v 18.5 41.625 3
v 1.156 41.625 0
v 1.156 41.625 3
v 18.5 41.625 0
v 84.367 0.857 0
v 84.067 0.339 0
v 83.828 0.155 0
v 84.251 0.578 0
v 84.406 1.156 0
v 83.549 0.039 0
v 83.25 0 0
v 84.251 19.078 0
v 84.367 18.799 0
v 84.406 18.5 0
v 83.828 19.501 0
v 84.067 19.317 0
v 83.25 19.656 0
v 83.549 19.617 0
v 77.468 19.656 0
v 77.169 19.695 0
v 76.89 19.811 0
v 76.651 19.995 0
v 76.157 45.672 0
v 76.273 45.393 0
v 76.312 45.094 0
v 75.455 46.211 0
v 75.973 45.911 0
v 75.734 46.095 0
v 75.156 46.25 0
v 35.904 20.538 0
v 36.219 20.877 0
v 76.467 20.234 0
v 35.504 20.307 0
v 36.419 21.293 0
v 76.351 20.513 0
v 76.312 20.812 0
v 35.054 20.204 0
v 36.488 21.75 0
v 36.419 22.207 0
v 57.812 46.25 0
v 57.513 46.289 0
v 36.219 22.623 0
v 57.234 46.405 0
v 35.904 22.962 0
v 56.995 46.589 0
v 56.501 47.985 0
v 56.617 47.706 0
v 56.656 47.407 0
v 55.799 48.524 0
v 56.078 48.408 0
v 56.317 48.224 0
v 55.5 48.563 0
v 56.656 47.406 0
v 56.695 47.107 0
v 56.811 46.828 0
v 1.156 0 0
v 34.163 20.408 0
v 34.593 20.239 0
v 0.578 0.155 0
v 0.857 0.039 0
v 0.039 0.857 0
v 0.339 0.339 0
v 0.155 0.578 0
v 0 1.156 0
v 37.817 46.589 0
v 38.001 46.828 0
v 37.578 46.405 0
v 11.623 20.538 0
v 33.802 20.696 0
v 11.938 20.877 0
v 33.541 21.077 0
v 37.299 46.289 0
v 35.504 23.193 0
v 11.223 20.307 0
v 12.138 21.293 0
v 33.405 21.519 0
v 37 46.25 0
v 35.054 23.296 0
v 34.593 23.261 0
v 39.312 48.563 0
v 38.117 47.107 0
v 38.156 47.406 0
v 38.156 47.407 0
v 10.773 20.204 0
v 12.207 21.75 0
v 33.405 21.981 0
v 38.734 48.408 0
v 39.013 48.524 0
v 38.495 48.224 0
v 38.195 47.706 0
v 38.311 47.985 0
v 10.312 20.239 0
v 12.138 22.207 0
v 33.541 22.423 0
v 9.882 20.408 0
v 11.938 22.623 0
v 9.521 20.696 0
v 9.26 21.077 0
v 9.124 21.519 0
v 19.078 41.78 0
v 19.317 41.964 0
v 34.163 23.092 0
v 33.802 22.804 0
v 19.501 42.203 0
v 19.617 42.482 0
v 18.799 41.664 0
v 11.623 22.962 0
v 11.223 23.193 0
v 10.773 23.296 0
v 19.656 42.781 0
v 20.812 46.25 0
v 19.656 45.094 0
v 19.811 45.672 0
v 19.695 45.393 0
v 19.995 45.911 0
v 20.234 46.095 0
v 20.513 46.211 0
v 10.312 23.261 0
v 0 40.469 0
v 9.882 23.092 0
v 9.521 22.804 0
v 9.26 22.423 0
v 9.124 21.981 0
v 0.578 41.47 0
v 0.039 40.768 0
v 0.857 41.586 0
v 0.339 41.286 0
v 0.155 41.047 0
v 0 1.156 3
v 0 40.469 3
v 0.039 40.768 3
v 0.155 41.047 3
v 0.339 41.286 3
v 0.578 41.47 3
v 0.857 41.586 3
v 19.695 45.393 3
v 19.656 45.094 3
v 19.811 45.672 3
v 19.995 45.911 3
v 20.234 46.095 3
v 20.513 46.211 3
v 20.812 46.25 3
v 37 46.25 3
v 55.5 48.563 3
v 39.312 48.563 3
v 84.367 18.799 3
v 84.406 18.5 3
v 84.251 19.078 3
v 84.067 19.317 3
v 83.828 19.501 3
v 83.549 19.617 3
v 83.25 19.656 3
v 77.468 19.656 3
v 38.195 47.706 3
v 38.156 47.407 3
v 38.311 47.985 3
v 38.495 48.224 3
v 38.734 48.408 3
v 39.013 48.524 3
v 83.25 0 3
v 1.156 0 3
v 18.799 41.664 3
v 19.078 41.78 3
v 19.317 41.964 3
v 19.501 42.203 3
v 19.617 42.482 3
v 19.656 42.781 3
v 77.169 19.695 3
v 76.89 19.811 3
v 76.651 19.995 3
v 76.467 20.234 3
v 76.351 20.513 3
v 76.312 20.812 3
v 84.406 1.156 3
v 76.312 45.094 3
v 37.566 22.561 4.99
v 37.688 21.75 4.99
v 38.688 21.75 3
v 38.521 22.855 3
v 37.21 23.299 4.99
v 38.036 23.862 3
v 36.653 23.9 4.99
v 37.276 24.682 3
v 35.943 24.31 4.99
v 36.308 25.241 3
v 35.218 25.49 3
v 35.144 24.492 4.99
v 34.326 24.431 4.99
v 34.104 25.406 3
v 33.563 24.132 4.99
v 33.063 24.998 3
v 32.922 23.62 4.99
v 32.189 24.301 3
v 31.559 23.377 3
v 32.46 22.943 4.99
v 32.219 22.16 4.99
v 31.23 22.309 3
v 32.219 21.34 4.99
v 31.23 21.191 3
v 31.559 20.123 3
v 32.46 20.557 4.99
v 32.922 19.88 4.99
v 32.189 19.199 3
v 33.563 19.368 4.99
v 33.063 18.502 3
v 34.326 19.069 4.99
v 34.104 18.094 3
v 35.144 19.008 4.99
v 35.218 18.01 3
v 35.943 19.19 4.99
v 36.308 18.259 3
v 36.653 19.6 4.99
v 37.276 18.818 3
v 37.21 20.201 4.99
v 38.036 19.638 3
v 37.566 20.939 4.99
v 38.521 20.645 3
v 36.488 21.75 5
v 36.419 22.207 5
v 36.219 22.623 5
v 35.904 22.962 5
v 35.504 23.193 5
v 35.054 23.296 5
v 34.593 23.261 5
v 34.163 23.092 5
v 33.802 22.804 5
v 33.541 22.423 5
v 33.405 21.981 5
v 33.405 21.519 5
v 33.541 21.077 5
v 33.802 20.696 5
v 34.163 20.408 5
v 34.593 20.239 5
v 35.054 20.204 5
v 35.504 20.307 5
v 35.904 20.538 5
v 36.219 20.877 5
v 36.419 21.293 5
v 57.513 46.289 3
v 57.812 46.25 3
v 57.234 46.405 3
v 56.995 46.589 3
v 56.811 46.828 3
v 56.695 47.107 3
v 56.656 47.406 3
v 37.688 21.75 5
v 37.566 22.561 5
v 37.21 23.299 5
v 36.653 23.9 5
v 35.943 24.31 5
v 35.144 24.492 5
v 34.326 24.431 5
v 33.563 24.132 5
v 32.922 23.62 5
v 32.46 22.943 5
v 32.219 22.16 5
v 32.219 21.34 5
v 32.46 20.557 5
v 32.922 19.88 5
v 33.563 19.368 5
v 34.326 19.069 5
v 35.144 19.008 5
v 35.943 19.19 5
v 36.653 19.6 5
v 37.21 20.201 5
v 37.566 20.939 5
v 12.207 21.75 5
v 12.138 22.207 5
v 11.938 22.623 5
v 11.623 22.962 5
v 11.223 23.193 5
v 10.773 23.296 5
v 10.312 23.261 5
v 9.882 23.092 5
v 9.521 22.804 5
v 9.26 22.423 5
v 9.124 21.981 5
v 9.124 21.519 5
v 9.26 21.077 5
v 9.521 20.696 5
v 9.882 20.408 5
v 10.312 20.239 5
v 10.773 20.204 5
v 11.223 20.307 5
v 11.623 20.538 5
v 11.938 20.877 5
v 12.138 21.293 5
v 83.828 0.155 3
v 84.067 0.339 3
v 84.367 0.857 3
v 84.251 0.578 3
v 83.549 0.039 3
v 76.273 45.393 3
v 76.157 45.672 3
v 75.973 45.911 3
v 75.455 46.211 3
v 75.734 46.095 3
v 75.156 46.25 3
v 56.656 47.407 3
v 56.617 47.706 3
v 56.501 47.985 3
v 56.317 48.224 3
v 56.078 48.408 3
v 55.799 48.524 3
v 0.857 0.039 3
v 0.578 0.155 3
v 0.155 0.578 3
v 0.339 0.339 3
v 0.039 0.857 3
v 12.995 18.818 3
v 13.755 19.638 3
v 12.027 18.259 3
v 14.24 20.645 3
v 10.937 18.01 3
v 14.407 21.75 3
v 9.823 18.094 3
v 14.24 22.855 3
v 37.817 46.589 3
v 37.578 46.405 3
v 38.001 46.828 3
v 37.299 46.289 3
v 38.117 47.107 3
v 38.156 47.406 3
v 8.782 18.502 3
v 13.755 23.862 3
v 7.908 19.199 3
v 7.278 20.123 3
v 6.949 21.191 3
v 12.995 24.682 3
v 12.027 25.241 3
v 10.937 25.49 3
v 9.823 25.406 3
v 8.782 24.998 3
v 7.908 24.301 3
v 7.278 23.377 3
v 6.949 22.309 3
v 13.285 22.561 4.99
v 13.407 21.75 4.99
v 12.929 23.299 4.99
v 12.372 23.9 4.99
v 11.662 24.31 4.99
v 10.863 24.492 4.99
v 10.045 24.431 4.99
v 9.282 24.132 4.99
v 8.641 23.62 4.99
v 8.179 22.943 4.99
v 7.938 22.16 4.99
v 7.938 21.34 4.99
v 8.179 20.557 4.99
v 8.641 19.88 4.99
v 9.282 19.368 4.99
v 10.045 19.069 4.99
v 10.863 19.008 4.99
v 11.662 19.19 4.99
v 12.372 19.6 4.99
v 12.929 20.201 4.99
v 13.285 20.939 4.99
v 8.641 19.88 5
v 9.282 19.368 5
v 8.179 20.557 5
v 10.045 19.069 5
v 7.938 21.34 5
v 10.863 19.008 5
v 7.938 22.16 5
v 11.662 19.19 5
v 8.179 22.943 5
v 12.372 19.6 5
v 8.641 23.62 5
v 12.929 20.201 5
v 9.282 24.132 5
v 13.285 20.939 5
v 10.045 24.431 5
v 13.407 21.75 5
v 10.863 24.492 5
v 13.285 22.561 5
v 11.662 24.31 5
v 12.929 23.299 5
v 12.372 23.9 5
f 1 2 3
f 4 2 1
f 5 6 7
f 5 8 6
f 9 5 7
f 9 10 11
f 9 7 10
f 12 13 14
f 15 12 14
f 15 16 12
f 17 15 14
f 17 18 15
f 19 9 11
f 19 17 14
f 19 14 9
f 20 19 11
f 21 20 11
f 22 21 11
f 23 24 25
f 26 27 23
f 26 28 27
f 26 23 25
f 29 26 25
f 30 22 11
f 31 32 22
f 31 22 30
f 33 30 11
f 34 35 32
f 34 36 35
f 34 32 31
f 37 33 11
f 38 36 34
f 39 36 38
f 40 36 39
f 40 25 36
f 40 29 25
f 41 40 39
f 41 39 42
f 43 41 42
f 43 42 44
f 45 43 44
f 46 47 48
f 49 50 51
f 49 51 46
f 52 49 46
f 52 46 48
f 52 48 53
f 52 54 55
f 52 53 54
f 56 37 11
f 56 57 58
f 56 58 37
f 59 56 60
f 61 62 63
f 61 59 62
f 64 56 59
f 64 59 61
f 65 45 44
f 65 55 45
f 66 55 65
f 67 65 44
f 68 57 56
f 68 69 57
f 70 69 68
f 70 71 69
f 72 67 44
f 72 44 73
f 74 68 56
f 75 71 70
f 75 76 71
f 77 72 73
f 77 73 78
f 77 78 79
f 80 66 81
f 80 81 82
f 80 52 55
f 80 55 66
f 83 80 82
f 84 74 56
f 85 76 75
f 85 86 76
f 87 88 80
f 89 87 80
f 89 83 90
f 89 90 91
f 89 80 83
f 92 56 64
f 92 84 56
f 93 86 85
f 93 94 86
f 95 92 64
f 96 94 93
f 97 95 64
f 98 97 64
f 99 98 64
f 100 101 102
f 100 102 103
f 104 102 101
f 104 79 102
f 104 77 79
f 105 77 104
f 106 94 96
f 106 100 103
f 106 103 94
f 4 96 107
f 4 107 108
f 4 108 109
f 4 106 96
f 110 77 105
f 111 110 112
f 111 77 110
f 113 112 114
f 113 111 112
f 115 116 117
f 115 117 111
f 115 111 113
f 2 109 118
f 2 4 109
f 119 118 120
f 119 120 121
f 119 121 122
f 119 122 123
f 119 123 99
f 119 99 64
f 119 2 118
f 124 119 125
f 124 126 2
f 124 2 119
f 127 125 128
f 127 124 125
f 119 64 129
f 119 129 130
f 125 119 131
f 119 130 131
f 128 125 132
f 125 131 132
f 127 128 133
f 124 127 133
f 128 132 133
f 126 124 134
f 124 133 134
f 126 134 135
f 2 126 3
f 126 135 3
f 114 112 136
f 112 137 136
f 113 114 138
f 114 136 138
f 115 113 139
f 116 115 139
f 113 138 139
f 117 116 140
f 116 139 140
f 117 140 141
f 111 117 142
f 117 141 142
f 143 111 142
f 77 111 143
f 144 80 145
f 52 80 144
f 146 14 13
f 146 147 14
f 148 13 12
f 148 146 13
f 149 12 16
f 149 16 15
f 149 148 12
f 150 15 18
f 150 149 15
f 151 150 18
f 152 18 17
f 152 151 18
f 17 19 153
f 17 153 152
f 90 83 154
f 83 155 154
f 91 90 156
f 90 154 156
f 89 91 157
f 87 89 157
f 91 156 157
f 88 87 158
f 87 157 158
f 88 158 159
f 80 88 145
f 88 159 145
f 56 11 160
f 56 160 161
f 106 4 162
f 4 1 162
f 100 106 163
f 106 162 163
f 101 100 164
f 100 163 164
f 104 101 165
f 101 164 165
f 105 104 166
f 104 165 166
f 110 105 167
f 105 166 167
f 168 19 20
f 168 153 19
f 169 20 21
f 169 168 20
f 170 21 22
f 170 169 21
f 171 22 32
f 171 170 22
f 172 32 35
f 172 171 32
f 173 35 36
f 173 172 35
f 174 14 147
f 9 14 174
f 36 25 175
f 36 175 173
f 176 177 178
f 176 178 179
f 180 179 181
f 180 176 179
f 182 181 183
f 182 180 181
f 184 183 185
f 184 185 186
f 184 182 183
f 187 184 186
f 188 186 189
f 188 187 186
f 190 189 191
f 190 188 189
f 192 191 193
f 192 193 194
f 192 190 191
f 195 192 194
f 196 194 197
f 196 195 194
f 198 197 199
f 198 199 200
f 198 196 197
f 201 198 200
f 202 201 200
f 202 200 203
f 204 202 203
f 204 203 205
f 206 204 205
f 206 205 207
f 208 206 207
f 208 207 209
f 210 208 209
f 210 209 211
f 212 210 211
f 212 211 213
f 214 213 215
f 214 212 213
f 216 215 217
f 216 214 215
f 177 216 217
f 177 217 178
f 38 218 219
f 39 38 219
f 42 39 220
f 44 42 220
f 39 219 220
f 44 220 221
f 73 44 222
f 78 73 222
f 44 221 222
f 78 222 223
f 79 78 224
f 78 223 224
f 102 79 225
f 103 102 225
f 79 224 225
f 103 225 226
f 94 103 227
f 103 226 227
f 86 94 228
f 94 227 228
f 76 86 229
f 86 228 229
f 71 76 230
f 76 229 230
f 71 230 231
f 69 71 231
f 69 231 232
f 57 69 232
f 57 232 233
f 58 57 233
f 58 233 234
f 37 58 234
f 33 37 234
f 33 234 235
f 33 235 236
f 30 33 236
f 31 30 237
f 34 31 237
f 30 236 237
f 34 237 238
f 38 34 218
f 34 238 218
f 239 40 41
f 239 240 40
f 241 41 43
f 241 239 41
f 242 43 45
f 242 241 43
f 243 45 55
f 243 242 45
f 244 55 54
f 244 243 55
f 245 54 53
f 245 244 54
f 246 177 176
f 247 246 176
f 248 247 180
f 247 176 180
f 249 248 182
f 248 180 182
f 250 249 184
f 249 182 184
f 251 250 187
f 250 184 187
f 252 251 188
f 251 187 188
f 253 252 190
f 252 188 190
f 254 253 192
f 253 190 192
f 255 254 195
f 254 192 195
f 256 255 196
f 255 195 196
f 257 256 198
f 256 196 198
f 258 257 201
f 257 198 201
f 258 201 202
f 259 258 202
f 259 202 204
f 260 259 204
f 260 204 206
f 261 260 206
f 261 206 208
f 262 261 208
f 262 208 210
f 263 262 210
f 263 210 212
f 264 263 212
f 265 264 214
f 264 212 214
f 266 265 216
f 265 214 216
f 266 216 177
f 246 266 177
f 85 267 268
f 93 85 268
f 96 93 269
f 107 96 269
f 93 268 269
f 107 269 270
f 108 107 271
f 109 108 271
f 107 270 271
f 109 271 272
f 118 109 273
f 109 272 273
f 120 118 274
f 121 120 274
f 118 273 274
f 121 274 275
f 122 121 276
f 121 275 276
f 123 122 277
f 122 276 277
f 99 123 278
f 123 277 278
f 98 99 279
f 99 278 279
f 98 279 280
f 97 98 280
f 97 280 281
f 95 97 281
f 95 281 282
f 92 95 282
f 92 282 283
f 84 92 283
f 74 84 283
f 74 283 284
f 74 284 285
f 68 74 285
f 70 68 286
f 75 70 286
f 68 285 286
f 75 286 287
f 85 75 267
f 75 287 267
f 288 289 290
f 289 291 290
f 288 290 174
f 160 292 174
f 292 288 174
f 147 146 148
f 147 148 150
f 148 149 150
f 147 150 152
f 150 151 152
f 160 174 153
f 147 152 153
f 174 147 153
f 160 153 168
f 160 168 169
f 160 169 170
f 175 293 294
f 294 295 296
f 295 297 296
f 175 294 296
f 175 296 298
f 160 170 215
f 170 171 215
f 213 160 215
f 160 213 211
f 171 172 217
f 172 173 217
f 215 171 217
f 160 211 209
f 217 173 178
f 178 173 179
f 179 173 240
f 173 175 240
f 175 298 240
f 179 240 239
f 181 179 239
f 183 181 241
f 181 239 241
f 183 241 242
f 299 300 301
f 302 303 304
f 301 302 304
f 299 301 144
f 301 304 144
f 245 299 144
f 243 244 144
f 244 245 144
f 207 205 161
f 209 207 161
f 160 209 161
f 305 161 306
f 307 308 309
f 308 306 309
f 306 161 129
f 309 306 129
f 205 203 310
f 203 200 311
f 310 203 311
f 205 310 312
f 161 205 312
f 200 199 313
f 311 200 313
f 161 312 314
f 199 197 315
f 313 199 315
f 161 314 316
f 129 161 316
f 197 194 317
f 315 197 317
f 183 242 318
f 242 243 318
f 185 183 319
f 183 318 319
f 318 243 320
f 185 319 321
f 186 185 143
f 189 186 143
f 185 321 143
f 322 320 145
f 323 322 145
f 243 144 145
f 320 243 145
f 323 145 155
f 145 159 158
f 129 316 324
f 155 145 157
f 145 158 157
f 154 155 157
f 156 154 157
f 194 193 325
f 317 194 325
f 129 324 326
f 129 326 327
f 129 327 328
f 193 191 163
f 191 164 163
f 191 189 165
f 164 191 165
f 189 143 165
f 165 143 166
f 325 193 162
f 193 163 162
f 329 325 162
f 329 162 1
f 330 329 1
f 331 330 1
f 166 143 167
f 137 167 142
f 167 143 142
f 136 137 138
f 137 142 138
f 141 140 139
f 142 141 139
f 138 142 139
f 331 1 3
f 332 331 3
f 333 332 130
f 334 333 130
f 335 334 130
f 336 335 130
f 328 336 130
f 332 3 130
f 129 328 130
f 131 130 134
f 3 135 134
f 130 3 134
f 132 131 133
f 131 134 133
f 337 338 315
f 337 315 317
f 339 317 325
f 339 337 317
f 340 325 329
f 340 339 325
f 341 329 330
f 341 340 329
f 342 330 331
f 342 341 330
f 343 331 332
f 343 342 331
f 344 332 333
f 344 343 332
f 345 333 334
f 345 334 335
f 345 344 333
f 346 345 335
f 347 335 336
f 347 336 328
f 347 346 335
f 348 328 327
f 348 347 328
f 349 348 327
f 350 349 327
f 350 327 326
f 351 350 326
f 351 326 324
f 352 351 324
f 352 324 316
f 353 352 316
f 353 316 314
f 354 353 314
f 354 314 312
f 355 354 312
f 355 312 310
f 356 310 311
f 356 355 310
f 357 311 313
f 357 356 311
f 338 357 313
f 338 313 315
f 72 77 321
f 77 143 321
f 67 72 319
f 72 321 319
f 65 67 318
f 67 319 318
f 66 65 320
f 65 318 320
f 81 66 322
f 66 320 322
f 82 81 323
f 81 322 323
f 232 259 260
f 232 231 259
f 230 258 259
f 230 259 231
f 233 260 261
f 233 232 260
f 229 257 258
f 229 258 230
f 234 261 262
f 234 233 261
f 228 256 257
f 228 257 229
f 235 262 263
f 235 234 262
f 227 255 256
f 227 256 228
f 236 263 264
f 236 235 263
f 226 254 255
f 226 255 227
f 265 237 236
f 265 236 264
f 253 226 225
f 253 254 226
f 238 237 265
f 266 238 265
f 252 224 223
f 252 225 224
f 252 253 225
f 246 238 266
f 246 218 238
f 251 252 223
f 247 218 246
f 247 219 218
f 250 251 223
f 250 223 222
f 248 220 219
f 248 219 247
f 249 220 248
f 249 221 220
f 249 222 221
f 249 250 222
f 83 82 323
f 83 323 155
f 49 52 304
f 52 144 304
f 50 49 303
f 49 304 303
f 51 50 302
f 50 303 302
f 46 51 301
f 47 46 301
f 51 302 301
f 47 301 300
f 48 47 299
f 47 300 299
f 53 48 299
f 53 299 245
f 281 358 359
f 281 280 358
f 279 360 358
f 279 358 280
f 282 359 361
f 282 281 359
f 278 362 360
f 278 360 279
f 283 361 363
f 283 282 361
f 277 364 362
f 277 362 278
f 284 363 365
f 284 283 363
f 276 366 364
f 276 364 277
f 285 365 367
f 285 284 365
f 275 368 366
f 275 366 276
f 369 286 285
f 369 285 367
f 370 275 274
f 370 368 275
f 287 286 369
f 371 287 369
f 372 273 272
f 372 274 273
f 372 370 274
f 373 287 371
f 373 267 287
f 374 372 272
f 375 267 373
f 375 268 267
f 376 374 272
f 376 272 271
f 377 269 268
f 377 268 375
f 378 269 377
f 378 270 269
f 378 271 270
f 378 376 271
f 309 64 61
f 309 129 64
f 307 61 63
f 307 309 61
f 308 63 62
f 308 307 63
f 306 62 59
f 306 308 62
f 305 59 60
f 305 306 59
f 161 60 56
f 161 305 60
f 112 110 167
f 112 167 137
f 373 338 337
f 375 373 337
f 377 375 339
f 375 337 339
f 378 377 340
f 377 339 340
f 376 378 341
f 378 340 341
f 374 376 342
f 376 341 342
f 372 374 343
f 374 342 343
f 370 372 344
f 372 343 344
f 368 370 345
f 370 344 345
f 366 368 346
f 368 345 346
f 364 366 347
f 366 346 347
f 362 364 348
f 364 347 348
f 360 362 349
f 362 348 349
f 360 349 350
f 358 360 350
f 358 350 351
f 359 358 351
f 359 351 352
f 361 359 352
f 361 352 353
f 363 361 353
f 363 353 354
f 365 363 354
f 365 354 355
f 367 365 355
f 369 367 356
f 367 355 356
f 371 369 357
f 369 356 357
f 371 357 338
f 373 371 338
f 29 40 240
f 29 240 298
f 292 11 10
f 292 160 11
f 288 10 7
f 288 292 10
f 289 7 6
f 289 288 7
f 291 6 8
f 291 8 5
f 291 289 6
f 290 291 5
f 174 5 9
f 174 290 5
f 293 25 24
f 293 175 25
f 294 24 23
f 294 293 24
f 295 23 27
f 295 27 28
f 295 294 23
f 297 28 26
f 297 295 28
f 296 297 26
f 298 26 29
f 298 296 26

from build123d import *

# Parameters (mm, degrees)
PAD_DEPTH     = 3
SKETCH001_R   = 2.75
PAD001_DEPTH  = 2
CHAMFER_SIZE2 = 1.99
CHAMFER_SIZE  = 1
SKETCH002_R   = 1.55
POCKET_DEPTH  = 5
FILLET_R      = 1.15625


with BuildPart() as part:
    # Sketch → Pad (new body)
    with BuildSketch(Plane.XY):
        Polygon((0, 0), (0, 41.625), (19.656, 41.625), (19.656, 46.25), (38.156, 46.25), (38.156, 48.563), (56.656, 48.563), (56.656, 46.25), (76.312, 46.25), (76.312, 19.656), (84.406, 19.656), (84.406, 0), align=None)
    extrude(amount=PAD_DEPTH)

    # Sketch001 (on Face14 of Pad) → Pad001 (join)
    with BuildSketch(Plane.XY.offset(3)):
        with Locations((10.657, 21.75)):
            Circle(SKETCH001_R)
        with Locations((34.938, 21.75)):
            Circle(SKETCH001_R)
    extrude(amount=PAD001_DEPTH)

    # Chamfer
    chamfer_edges = [part.edges().sort_by_distance(p)[0] for p in [
        (7.907, 21.75, 3),
        (32.188, 21.75, 3),
    ]]
    chamfer_side = part.faces().sort_by_distance((41.05483, 22.316964, 3))[0]
    chamfer(chamfer_edges, length=CHAMFER_SIZE, length2=CHAMFER_SIZE2, reference=chamfer_side)

    # Sketch002 (on Face19 of Chamfer) → Pocket (cut)
    with BuildSketch(Plane.XY.offset(5)):
        with Locations((10.657, 21.75)):
            Circle(SKETCH002_R)
        with Locations((34.938, 21.75)):
            Circle(SKETCH002_R)
    extrude(amount=-POCKET_DEPTH, mode=Mode.SUBTRACT)

    # Fillet
    fillet_edges = [part.edges().sort_by_distance(p)[0] for p in [
        (84.406, 0, 1.5),
        (84.406, 19.656, 1.5),
        (76.312, 19.656, 1.5),
        (76.312, 46.25, 1.5),
        (56.656, 46.25, 1.5),
        (56.656, 48.563, 1.5),
        (38.156, 48.563, 1.5),
        (19.656, 46.25, 1.5),
        (0, 41.625, 1.5),
        (38.156, 46.25, 1.5),
        (19.656, 41.625, 1.5),
        (0, 0, 1.5),
    ]]
    fillet(fillet_edges, radius=FILLET_R)


solid = part.part
